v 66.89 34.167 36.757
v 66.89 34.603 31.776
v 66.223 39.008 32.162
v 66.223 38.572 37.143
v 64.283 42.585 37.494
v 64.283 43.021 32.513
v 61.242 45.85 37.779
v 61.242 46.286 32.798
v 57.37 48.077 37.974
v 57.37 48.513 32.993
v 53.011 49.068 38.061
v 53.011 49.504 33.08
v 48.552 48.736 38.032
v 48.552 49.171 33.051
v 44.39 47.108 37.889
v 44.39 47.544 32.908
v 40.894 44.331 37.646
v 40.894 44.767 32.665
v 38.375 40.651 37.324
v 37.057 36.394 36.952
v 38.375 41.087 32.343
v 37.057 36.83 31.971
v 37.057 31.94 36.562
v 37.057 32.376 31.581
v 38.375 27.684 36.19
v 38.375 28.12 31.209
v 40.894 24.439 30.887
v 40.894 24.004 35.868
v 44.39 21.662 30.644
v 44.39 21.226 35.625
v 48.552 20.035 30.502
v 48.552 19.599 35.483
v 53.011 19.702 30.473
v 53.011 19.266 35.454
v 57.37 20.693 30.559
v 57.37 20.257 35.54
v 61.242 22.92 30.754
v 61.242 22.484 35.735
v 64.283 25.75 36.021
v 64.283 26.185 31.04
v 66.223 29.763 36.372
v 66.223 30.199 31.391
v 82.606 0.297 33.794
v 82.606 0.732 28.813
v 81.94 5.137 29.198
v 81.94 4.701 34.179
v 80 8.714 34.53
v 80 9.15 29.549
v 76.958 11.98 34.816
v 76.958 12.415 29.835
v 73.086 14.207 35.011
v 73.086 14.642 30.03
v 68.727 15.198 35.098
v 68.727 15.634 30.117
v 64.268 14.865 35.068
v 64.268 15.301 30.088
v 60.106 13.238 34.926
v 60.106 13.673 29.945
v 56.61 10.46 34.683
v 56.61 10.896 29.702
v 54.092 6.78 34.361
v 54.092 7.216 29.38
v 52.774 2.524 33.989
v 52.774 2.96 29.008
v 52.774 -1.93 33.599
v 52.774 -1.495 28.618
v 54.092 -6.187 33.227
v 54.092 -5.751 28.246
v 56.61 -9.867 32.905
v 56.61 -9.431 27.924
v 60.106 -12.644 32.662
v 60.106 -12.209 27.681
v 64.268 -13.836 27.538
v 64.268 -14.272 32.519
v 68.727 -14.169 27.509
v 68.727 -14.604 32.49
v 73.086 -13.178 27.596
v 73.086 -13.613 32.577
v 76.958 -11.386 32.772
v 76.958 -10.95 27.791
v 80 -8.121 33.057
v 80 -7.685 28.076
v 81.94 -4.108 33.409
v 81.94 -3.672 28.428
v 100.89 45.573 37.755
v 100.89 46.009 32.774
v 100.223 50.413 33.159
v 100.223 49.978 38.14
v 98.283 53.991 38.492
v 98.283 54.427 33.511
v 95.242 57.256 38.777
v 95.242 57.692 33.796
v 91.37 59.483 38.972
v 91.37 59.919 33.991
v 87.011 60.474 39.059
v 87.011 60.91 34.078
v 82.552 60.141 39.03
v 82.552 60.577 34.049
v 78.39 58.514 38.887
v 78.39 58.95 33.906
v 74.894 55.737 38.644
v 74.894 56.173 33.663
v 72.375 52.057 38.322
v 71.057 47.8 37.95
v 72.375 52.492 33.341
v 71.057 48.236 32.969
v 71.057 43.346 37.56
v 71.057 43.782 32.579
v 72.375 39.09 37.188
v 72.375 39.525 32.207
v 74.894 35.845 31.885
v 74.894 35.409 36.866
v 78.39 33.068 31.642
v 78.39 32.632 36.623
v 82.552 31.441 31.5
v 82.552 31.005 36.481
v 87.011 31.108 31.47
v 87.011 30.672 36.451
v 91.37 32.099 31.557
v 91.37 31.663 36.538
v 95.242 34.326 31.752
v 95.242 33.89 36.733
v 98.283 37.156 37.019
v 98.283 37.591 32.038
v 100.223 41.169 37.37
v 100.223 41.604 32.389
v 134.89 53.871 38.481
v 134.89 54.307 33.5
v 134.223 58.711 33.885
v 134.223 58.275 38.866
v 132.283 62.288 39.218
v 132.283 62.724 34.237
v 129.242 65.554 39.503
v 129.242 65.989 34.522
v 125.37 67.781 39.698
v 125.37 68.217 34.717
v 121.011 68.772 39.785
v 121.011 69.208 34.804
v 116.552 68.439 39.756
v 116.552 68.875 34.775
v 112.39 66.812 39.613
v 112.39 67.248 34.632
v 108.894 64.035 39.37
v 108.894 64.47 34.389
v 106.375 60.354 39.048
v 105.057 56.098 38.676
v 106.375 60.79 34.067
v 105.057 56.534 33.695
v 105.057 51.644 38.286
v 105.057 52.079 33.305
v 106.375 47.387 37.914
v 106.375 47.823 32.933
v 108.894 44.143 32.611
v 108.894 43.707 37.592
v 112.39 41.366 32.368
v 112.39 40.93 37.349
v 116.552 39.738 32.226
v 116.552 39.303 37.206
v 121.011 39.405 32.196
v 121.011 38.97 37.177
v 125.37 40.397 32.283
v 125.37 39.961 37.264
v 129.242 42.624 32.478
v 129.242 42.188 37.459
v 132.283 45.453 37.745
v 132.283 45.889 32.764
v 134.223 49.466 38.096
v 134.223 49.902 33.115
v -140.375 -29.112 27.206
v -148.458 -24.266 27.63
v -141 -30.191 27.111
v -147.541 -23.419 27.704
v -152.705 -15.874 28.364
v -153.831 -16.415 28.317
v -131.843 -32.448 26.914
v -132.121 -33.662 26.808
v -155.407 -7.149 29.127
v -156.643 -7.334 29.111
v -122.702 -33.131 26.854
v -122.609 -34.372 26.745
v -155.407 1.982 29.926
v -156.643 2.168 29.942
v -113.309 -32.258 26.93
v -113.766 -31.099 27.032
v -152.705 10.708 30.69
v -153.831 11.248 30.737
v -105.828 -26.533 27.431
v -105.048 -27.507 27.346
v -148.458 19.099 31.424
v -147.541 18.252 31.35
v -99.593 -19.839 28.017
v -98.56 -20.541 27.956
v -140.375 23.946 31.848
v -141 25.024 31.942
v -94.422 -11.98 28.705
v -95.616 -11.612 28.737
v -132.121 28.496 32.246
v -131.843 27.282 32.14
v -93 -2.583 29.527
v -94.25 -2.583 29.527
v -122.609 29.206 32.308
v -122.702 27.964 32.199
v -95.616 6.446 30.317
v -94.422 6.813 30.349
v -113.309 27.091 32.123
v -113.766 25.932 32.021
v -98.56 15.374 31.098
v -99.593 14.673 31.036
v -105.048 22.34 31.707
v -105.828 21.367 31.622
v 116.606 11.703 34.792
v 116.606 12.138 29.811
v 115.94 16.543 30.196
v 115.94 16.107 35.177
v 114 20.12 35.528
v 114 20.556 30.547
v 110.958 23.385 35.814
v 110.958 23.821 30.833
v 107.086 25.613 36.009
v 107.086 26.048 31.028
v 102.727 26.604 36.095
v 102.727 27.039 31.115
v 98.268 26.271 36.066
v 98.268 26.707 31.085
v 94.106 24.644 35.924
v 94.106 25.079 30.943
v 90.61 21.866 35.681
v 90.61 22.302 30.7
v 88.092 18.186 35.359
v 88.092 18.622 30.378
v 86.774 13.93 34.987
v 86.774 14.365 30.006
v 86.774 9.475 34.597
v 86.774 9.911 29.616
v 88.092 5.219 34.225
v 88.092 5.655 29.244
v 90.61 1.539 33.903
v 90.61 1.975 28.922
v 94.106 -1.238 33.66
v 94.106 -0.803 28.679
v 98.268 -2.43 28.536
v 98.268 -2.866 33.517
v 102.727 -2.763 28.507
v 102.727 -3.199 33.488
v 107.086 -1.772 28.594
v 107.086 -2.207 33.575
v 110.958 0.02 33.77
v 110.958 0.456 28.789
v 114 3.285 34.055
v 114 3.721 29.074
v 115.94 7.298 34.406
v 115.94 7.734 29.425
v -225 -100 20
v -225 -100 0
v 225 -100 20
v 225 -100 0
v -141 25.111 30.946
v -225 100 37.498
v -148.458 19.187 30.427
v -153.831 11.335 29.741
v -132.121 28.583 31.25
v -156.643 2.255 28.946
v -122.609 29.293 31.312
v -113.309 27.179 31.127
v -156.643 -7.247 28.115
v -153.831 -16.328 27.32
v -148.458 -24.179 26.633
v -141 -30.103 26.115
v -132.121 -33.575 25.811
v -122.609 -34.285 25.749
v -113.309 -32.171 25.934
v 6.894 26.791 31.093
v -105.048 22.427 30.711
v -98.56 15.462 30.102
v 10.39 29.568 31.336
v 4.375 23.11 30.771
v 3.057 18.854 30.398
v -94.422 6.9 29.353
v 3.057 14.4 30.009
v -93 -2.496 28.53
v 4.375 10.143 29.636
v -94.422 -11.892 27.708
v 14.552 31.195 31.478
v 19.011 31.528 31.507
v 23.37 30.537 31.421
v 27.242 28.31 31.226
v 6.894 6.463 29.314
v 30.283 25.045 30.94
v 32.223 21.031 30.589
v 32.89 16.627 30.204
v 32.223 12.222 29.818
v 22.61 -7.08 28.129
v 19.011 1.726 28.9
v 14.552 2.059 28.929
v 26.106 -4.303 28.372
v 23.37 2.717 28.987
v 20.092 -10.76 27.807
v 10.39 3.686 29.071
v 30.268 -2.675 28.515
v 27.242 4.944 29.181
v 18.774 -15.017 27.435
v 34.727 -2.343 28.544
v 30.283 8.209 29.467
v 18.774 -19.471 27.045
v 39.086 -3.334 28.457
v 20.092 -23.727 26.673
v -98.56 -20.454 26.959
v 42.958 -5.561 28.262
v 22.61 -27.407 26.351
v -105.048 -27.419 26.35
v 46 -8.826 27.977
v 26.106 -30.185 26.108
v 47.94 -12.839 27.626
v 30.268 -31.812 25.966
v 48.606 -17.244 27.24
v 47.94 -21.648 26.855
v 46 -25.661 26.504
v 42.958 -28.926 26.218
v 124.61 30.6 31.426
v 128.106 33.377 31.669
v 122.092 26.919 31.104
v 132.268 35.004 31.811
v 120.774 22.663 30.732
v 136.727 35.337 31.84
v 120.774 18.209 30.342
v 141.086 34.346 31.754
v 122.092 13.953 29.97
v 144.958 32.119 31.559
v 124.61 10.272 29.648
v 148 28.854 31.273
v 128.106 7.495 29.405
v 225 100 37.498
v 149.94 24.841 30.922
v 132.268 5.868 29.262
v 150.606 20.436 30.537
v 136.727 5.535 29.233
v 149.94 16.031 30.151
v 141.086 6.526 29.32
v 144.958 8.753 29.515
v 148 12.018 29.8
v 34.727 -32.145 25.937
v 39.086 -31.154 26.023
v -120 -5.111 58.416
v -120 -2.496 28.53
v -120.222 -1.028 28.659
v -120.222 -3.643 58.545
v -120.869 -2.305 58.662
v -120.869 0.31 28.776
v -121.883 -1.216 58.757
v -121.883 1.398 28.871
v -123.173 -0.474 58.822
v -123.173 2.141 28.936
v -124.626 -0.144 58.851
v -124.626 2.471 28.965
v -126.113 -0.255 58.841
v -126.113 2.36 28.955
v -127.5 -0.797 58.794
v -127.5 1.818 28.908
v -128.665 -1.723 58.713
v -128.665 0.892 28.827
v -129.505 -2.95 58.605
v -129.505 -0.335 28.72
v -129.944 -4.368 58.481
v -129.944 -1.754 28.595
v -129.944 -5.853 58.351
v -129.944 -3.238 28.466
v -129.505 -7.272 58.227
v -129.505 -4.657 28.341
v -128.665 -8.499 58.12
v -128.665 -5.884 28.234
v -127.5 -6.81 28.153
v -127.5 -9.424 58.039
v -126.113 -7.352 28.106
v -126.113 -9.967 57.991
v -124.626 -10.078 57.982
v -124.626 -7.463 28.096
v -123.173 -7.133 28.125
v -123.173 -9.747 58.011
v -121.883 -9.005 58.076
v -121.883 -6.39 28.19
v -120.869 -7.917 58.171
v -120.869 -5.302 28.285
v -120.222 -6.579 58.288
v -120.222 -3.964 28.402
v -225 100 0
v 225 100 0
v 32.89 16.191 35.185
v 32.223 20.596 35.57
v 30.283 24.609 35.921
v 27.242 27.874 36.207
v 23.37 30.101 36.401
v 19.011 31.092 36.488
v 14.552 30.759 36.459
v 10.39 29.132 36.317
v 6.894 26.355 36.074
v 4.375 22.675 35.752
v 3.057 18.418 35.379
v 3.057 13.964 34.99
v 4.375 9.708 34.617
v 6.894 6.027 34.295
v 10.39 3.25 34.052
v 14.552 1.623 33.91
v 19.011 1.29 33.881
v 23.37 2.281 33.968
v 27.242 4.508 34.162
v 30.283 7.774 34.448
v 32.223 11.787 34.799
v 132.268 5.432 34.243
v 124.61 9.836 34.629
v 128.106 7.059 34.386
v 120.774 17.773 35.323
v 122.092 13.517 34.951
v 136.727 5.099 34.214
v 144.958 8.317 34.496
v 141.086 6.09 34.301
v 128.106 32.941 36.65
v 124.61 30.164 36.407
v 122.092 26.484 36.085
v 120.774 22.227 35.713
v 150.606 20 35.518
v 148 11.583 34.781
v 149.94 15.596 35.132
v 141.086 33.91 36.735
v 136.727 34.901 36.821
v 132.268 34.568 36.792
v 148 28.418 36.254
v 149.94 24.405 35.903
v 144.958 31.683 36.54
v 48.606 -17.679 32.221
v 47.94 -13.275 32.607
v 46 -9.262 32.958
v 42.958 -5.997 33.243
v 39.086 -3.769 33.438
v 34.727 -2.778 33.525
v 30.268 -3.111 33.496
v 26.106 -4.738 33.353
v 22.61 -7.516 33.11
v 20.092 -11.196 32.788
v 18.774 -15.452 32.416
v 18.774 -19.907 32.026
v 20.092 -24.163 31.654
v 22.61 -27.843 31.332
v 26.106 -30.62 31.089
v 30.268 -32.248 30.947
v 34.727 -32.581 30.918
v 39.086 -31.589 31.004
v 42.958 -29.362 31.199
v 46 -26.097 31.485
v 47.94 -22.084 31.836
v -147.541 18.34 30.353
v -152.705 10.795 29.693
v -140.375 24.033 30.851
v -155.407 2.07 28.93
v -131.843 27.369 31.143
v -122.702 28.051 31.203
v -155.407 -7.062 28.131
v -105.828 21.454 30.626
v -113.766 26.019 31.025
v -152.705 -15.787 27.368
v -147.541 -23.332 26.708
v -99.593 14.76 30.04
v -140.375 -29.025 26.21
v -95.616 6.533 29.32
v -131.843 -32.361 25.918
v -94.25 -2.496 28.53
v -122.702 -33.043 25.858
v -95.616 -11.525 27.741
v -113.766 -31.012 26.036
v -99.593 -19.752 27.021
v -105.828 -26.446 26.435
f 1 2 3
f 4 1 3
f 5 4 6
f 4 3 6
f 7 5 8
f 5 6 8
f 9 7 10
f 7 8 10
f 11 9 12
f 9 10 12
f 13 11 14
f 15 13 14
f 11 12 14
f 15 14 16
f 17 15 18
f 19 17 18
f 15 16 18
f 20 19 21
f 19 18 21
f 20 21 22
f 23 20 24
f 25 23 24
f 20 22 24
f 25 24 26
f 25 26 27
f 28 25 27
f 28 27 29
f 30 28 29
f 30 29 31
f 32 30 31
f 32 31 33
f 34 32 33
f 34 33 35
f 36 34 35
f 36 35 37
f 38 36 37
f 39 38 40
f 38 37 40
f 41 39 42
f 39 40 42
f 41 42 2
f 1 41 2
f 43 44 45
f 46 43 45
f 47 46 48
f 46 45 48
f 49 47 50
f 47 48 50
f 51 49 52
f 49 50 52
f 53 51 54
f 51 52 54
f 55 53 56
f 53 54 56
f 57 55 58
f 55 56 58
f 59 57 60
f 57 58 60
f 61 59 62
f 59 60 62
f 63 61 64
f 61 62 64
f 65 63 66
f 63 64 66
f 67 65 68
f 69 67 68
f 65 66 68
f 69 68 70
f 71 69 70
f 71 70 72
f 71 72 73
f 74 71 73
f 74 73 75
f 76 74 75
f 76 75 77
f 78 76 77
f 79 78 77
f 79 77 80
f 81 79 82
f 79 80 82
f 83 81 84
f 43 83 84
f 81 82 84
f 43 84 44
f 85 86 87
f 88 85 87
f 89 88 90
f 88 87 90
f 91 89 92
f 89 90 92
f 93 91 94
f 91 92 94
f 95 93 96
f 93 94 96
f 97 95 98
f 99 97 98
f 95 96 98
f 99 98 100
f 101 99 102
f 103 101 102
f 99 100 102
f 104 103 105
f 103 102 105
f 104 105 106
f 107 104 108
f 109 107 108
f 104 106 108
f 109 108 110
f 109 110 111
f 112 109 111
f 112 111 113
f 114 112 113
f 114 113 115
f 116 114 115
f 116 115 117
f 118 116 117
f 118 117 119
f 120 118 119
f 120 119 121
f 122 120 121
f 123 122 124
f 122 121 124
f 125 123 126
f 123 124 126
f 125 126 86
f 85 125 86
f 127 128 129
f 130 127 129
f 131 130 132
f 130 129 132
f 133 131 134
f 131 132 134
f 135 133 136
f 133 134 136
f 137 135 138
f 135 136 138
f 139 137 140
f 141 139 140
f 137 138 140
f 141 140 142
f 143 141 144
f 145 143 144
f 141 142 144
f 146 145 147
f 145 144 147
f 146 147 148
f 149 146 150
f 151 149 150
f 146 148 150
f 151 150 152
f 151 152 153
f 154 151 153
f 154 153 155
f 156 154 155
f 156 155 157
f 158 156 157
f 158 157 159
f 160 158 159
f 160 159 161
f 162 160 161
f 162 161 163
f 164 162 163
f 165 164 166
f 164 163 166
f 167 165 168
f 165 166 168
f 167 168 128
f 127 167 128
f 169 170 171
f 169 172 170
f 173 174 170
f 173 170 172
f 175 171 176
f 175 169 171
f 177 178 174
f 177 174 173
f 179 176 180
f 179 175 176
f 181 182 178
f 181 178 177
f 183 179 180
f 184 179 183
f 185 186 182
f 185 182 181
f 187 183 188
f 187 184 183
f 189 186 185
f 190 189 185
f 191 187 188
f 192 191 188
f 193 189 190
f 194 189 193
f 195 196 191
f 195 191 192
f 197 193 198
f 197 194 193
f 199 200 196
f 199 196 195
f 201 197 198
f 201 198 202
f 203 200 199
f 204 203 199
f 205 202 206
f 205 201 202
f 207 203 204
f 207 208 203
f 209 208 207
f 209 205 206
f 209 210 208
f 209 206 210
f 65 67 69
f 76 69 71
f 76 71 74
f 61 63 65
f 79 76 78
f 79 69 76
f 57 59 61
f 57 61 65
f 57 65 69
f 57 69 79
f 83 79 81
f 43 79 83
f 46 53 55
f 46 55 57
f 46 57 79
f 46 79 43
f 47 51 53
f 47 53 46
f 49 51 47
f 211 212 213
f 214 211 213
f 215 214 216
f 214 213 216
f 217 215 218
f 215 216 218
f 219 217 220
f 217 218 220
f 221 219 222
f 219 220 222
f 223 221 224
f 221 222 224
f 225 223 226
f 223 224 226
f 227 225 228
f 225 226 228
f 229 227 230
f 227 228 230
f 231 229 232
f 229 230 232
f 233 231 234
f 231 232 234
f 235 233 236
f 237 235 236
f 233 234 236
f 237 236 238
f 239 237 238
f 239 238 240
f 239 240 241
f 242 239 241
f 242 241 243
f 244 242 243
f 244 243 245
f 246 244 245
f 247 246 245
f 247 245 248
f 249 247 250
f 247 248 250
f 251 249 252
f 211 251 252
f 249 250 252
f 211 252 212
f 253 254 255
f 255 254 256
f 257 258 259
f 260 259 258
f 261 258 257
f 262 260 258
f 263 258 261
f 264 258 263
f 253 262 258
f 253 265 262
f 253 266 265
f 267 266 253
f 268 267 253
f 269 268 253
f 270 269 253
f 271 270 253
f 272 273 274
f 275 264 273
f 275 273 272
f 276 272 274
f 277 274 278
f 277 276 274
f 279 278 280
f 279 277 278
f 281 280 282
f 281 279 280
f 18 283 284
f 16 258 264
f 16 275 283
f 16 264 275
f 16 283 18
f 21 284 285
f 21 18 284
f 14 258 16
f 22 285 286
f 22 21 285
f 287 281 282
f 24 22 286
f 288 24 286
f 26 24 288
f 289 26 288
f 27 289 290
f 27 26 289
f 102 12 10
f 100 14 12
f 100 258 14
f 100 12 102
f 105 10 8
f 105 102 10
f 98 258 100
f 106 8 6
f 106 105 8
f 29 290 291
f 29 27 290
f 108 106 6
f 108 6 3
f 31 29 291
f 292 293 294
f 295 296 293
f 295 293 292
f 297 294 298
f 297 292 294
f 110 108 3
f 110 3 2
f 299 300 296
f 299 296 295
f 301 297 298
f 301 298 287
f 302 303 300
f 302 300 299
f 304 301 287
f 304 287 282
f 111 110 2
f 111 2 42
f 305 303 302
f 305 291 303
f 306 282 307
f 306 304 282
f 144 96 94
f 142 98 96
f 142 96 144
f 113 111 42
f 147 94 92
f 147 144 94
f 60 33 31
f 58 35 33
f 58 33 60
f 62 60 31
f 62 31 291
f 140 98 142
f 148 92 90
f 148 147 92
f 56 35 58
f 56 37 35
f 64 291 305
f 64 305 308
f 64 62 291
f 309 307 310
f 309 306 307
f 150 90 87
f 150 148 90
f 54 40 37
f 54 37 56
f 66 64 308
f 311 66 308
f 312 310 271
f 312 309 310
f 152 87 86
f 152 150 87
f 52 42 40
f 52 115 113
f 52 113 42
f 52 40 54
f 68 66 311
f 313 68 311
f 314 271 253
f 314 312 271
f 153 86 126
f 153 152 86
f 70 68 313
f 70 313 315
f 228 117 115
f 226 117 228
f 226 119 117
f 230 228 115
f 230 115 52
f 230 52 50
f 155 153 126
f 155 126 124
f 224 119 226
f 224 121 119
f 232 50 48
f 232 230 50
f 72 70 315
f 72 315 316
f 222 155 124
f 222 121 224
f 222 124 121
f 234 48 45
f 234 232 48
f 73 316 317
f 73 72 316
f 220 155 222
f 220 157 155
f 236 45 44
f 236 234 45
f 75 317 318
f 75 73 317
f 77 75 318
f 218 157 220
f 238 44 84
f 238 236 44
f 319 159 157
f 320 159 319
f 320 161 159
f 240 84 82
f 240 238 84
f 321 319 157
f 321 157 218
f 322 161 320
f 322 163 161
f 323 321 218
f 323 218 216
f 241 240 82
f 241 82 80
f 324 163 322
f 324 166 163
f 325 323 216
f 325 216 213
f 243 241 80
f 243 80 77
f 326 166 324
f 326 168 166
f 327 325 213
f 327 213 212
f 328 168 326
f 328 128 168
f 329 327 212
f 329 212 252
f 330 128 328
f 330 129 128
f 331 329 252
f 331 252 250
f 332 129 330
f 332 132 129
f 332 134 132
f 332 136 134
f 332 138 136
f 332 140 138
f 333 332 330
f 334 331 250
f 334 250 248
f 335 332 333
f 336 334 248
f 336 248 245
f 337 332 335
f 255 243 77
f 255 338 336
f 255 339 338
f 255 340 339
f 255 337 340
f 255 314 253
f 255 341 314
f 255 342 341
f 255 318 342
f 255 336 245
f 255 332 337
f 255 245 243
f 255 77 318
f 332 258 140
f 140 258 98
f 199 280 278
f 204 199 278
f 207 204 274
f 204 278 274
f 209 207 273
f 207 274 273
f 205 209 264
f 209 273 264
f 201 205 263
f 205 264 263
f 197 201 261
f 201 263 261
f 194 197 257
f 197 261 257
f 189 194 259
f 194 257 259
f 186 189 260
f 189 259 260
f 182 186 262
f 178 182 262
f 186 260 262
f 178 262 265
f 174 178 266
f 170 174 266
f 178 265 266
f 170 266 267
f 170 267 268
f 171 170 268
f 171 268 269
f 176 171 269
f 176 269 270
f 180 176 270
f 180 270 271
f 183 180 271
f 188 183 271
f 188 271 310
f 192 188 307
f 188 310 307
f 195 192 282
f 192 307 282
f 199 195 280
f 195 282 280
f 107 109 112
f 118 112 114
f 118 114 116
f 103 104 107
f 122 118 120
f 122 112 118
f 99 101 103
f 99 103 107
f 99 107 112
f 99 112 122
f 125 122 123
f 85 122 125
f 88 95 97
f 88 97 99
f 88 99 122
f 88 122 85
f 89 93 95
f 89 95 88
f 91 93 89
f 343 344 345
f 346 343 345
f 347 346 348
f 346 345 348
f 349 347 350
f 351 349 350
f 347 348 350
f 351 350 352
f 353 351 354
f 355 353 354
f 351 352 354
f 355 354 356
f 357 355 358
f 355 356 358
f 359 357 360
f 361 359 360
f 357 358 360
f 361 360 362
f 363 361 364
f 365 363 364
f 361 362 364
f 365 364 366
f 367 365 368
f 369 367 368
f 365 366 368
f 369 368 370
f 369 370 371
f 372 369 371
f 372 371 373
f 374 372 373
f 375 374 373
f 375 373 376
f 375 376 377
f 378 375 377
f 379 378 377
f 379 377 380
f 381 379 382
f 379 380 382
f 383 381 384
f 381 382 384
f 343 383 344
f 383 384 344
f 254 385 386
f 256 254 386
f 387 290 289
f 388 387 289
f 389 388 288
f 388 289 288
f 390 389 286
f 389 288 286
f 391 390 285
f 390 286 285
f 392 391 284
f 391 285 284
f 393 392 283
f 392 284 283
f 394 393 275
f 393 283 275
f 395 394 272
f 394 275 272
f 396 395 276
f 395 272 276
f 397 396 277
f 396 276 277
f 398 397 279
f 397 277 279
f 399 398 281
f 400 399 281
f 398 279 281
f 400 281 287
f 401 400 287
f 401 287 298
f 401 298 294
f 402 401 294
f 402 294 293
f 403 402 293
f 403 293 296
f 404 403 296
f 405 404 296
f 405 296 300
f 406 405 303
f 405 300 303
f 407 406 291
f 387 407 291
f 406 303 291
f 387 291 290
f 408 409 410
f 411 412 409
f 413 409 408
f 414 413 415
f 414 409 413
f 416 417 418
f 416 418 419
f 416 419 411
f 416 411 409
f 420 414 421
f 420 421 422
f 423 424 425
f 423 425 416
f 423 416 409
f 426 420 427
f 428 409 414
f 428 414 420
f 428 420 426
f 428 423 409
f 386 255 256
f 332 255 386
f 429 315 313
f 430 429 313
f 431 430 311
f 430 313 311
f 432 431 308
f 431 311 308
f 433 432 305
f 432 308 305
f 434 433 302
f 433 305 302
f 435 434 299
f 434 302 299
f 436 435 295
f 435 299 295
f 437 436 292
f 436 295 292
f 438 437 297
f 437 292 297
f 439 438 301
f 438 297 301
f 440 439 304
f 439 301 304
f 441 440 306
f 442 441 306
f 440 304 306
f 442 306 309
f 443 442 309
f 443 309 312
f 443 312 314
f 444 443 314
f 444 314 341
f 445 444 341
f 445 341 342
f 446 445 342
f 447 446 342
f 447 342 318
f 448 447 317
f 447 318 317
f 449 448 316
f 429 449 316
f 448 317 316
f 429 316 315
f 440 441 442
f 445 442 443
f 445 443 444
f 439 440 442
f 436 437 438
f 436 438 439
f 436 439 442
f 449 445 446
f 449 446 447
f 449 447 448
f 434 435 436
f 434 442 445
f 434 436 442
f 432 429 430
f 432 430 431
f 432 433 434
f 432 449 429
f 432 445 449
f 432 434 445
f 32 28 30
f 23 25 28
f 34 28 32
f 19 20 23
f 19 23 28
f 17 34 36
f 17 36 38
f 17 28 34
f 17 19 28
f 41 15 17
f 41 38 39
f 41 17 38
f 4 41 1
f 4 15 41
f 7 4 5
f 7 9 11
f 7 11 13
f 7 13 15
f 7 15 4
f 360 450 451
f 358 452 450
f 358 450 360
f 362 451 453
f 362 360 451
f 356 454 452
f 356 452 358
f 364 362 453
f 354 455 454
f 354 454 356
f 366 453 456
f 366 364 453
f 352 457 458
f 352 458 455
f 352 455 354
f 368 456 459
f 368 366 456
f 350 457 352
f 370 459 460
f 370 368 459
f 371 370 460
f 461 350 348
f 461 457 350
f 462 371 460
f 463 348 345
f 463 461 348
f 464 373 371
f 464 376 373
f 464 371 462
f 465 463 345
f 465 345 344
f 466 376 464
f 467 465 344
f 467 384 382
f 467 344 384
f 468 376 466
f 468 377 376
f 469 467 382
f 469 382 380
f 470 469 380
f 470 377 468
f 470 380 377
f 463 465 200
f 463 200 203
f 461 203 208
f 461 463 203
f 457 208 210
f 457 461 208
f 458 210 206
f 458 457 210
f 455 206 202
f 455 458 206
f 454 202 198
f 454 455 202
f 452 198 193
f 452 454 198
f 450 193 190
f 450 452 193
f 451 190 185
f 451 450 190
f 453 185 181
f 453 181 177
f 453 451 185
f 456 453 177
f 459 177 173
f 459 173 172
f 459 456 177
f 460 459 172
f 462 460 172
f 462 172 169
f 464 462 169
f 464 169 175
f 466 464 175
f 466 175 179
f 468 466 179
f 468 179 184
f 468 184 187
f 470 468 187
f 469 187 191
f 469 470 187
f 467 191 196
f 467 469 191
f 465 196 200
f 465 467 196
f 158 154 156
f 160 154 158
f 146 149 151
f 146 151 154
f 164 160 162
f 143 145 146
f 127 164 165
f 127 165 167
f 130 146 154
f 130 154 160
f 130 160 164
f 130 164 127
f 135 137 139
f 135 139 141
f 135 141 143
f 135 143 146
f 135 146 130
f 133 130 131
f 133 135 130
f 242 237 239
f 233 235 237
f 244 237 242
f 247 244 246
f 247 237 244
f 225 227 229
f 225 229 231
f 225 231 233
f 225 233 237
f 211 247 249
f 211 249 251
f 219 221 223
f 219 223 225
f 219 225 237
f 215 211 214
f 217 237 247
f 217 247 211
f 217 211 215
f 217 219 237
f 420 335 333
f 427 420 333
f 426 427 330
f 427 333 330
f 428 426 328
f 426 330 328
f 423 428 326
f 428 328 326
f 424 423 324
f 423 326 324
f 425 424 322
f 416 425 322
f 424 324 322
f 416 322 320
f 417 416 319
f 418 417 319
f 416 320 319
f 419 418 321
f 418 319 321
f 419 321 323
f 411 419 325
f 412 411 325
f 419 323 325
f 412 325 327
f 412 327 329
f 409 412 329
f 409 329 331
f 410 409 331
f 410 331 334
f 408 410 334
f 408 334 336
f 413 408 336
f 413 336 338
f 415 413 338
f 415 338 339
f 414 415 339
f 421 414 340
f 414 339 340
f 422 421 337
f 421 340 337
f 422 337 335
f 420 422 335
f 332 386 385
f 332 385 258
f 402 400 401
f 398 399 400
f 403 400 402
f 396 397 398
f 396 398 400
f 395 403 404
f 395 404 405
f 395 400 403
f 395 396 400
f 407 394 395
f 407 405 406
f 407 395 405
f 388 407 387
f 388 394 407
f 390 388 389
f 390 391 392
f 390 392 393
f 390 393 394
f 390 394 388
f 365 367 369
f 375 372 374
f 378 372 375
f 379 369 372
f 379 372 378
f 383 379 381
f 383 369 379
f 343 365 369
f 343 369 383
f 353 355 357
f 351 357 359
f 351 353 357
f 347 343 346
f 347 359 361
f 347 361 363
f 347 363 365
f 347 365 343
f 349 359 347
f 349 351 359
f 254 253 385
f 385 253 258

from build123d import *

# Parameters (mm, degrees)
F0_W     = 450
F0_H     = 200
F1_DEPTH = 20
F3_DEPTH = 450
F4_R     = 15
F5_DEPTH = 5
F4_R_2   = 32
F4_R_3   = 30.75
F6_DEPTH = 1
F4_R_4   = 5
F7_DEPTH = 30


with BuildPart() as f1:
    # F0 (on Top) → F1 (new body)
    with BuildSketch(Plane.XY):
        Rectangle(F0_W, F0_H)
    extrude(amount=F1_DEPTH)

    # F2 (on face) → F3 (join)
    with BuildSketch(Plane.YZ.offset(225)):
        Polygon((100, 37.4977327052), (-100, 20), (100, 20), align=None)
    extrude(amount=-F3_DEPTH)

    # F4 (on face) → F5 (join)
    with BuildSketch(Plane(origin=(0, -2.4960941261, 28.5304864135), x_dir=(1, 0, 0), z_dir=(0, -0.0871557427, 0.9961946981))):
        with Locations((17.8897663927, 19.1961097517)):
            Circle(F4_R)
        with Locations((33.6060567503, -14.8038902483)):
            Circle(F4_R)
        with Locations((51.8897663927, 37.2408752097)):
            Circle(F4_R)
        with Locations((67.6060567503, 3.2408752097)):
            Circle(F4_R)
        with Locations((85.8897663927, 48.6903541087)):
            Circle(F4_R)
        with Locations((101.6060567503, 14.6903541087)):
            Circle(F4_R)
        with Locations((119.8897663927, 57.0196919143)):
            Circle(F4_R)
        with Locations((135.6060567503, 23.0196919143)):
            Circle(F4_R)
    extrude(amount=F5_DEPTH)

    # F4 (on face) → F6 (join)
    with BuildSketch(Plane(origin=(0, -2.4960941261, 28.5304864135), x_dir=(1, 0, 0), z_dir=(0, -0.0871557427, 0.9961946981))):
        with Locations((-125, 0)):
            Circle(F4_R_2)
        with Locations((-125, 0)):
            Circle(F4_R_3, mode=Mode.SUBTRACT)
    extrude(amount=F6_DEPTH)

    # F4 (on face) → F7 (join)
    with BuildSketch(Plane(origin=(0, -2.4960941261, 28.5304864135), x_dir=(1, 0, 0), z_dir=(0, -0.0871557427, 0.9961946981))):
        with Locations((-125, 0)):
            Circle(F4_R_4)
    extrude(amount=F7_DEPTH)


solid = f1.part
